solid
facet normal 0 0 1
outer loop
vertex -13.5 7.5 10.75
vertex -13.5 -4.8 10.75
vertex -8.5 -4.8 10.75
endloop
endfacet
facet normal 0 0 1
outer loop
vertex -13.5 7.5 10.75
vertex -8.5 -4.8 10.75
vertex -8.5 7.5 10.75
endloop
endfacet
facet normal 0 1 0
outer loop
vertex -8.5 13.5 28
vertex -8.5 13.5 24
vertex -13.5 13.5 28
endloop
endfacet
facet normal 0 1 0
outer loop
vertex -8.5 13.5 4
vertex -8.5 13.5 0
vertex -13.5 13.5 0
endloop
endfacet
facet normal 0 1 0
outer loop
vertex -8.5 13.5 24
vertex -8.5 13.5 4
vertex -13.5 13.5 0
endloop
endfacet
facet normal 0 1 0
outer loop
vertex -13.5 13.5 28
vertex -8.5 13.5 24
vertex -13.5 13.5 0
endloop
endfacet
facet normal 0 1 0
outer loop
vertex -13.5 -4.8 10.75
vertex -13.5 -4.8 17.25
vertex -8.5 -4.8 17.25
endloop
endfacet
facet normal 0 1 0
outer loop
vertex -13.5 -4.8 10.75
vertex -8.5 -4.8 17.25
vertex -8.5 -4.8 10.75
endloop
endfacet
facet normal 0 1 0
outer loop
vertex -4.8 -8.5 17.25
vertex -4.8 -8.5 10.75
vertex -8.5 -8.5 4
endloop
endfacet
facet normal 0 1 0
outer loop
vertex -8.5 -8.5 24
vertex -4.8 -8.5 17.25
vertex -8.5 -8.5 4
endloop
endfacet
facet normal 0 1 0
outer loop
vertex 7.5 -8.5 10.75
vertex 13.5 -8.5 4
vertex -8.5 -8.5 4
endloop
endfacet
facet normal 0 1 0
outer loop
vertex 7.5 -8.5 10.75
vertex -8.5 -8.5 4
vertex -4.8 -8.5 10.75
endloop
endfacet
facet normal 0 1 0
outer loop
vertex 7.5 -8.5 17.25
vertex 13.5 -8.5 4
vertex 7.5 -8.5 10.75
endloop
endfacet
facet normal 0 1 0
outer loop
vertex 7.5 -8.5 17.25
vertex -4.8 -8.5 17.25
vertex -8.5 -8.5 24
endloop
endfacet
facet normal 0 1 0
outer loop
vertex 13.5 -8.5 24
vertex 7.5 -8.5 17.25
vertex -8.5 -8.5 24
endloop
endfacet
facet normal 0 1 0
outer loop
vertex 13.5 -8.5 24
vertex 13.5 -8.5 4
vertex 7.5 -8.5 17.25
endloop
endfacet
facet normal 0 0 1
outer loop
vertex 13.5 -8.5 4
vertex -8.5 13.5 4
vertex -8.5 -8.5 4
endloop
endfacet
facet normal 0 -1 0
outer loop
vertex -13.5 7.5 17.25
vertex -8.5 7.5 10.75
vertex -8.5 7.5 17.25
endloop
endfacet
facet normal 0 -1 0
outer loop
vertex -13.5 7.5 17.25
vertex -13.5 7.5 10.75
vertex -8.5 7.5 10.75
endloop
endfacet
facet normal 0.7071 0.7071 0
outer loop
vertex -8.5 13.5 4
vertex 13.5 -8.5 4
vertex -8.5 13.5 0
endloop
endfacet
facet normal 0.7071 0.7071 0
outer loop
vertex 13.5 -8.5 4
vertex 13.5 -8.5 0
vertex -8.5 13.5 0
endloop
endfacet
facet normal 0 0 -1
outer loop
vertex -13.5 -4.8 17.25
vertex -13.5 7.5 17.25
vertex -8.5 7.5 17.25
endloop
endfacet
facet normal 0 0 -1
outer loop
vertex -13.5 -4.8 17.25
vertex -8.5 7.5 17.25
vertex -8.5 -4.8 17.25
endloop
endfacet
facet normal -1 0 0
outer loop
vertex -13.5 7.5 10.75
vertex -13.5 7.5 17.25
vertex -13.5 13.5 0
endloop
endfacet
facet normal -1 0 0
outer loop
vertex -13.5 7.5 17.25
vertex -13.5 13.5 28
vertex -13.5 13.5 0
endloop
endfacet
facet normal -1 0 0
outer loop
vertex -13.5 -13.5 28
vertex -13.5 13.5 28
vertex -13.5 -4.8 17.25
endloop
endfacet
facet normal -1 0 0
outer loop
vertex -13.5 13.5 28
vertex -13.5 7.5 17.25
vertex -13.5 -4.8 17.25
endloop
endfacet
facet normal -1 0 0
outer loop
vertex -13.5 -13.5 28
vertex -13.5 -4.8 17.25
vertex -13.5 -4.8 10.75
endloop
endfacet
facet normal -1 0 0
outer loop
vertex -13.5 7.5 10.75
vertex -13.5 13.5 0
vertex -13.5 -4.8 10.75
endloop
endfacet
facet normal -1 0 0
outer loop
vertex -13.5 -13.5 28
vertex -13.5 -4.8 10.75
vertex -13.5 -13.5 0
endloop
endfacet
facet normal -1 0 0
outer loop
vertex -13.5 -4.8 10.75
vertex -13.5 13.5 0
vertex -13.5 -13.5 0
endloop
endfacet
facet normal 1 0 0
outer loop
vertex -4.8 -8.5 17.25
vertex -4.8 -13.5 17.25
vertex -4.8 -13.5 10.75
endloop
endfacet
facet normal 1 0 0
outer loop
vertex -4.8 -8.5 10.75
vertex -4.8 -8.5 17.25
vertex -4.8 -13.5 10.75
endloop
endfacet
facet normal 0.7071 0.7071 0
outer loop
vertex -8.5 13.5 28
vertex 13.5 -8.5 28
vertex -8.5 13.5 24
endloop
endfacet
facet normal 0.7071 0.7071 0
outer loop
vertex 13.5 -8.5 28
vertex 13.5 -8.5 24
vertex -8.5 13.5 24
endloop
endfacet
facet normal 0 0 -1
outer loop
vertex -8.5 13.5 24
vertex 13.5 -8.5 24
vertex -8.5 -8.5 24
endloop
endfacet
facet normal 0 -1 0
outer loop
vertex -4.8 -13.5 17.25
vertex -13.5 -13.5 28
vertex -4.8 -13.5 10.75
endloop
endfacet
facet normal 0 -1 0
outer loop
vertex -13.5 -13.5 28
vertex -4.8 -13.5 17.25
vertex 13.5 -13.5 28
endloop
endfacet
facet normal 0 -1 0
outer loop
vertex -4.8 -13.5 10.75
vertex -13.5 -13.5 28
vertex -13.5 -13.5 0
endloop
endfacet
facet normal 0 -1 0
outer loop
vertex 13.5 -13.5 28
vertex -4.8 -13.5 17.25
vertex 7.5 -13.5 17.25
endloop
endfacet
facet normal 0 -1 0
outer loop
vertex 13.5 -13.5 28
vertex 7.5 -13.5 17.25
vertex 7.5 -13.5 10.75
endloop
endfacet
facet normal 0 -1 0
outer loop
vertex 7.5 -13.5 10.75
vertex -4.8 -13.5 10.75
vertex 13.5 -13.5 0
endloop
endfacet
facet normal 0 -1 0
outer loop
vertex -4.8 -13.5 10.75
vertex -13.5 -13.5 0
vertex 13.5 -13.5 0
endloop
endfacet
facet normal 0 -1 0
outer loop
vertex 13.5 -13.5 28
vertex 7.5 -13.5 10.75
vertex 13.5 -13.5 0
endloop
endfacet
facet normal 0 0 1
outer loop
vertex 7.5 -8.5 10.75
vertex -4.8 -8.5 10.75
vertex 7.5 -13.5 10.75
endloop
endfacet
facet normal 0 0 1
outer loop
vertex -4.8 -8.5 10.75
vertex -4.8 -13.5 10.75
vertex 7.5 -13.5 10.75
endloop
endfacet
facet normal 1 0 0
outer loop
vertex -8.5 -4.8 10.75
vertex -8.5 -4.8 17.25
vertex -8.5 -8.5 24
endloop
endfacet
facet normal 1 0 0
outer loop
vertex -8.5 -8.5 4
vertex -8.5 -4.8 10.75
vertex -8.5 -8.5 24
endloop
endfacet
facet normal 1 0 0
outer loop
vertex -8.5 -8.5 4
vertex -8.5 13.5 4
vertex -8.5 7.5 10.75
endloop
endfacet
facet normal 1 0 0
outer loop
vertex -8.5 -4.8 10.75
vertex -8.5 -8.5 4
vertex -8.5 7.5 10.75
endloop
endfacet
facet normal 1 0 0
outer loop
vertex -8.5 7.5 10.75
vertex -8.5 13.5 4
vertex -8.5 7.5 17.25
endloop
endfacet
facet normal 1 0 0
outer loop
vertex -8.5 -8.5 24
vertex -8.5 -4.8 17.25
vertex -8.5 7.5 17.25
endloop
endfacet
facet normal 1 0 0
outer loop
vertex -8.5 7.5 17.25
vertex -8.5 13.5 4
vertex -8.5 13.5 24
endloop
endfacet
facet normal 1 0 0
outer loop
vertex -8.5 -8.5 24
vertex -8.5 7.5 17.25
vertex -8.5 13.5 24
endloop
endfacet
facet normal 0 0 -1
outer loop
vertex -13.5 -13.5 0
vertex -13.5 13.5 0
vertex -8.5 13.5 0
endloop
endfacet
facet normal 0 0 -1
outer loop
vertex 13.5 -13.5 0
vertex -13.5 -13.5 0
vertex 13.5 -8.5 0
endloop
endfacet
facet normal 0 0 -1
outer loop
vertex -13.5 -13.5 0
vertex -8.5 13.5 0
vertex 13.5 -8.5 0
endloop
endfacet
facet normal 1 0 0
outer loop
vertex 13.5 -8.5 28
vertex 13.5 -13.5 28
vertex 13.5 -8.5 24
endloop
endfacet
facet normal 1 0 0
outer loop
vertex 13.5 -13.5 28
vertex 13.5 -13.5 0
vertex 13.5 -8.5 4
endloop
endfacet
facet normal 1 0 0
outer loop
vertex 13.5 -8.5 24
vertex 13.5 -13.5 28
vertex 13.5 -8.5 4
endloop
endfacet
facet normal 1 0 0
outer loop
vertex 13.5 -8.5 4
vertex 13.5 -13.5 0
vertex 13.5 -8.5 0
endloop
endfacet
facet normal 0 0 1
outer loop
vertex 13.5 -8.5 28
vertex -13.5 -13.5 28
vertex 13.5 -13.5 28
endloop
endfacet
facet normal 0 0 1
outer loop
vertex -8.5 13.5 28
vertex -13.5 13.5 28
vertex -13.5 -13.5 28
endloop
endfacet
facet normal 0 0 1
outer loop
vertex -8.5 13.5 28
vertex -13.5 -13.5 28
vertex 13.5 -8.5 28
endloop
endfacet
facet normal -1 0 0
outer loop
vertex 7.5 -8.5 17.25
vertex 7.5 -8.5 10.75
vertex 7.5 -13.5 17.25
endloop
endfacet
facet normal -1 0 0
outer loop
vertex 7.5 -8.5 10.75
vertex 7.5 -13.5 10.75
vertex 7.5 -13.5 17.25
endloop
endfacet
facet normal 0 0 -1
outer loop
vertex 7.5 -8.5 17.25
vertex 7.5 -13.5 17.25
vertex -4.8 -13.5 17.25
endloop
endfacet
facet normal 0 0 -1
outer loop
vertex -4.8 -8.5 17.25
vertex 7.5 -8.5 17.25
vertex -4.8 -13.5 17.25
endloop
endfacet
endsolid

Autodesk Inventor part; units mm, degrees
ref_plane "YZ Plane" through (0, 0, 0) normal (1, 0, 0) x (0, 1, 0)
ref_plane "XZ Plane" through (0, 0, 0) normal (0, 1, 0) x (-1, 0, 0)
sketch "Náčrt1" plane through (0, 0, 0) normal (0, 0, 1) x (1, 0, 0)
  line L0 (-18.9, 0) -> (18.9, 0) projected
  line L1 (0, 18.9) -> (0, -18.9) projected
  line L2 (-13.5, -13.5) -> (13.5, -13.5)
  line L3 (13.5, -13.5) -> (13.5, -8.5)
  line L4 (13.5, -8.5) -> (-8.5, 13.5)
  line L5 (-8.5, 13.5) -> (-13.5, 13.5)
  line L6 (-13.5, 13.5) -> (-13.5, -13.5)
  point P0 (0, 0)
  dimension "d0" = 27
  dimension "d1" = 27
  dimension "d2" = 5
  dimension "d3" = 5
extrude "Vysunutí1" add sketch "Náčrt1" along normal blind 28
ref_plane "Pracovní rovina3" through (13.5, -13.5, 0) normal (-1, 0, 0) x (0, 0, 1)
sketch "Náčrt5" plane through (13.5, -13.5, 0) normal (-1, 0, 0) x (0, 0, 1)
  line L0 (0, 5) -> (0, 27) projected
  line L1 (0, 27) -> (28, 27) projected
  line L2 (28, 5) -> (28, 27) projected
  line L3 (0, 5) -> (28, 5) projected
  line L4 (24, 27) -> (4, 27)
  line L5 (4, 27) -> (4, 5)
  line L6 (4, 5) -> (24, 5)
  line L7 (24, 5) -> (24, 27)
  point P0 (0, 13.5)
  dimension "d24" = 20
  dimension "d25" = 4
extrude "Vysunutí5" cut sketch "Náčrt5" along normal blind 22 contours L5 L1 L7 L3
sketch "Náčrt6" plane through (-13.5, -13.5, 0) normal (-1, 0, 0) x (0, 0, 1)
  line L0 (0, 27) -> (0, 0) projected
  line L1 (0, 0) -> (28, 0) projected
  line L2 (28, 27) -> (28, 0) projected
  line L3 (0, 27) -> (28, 27) projected
  line L4 (10.75, 21) -> (17.25, 21)
  line L5 (17.25, 21) -> (17.25, 8.7)
  line L6 (17.25, 8.7) -> (10.75, 8.7)
  line L7 (10.75, 8.7) -> (10.75, 21)
  point P0 (0, 13.5)
  dimension "d28" = 6.5
  dimension "d29" = 12.3
  dimension "d30" = 10.75
  dimension "d31" = 6
extrude "Vysunutí6" cut sketch "Náčrt6" against normal through all contours L4 L5 L6 L7
pattern_circular "Kruhové pole1" count 2 over 90 about axis through (-13.5, -13.5, 0) along (0, 0, -1) of "Vysunutí6"
sketch "Náčrt7" plane through (-13.5, -13.5, 0) normal (0, -1, 0) x (1, 0, 0)
  line L0 (0, 0) -> (27, 0) projected
  line L1 (27, 0) -> (27, 28) projected
  line L2 (0, 28) -> (27, 28) projected
  line L3 (0, 0) -> (0, 28) projected
  line L4 (-5.4, 0) -> (32.4, 0) projected
  line L5 (-5.4, 0) -> (32.4, 0) projected
  line L6 (13.5, -5.6) -> (13.5, 33.6) projected
  line L7 (21, 17.25) -> (8.7, 17.25)
  line L8 (8.7, 17.25) -> (8.7, 10.75)
  line L9 (8.7, 10.75) -> (21, 10.75)
  line L10 (21, 10.75) -> (21, 17.25)
  point P0 (13.5, 0)
  dimension "d37" = 12.3
  dimension "d38" = 6.5
  dimension "d39" = 6
  dimension "d40" = 10.75
extrude "Vysunutí7" cut sketch "Náčrt7" against normal through all contours L9 L8 L7 L6 | L6 L7 L10 L9
properties part number "masterpiece_uhelnik_3D tisk"
